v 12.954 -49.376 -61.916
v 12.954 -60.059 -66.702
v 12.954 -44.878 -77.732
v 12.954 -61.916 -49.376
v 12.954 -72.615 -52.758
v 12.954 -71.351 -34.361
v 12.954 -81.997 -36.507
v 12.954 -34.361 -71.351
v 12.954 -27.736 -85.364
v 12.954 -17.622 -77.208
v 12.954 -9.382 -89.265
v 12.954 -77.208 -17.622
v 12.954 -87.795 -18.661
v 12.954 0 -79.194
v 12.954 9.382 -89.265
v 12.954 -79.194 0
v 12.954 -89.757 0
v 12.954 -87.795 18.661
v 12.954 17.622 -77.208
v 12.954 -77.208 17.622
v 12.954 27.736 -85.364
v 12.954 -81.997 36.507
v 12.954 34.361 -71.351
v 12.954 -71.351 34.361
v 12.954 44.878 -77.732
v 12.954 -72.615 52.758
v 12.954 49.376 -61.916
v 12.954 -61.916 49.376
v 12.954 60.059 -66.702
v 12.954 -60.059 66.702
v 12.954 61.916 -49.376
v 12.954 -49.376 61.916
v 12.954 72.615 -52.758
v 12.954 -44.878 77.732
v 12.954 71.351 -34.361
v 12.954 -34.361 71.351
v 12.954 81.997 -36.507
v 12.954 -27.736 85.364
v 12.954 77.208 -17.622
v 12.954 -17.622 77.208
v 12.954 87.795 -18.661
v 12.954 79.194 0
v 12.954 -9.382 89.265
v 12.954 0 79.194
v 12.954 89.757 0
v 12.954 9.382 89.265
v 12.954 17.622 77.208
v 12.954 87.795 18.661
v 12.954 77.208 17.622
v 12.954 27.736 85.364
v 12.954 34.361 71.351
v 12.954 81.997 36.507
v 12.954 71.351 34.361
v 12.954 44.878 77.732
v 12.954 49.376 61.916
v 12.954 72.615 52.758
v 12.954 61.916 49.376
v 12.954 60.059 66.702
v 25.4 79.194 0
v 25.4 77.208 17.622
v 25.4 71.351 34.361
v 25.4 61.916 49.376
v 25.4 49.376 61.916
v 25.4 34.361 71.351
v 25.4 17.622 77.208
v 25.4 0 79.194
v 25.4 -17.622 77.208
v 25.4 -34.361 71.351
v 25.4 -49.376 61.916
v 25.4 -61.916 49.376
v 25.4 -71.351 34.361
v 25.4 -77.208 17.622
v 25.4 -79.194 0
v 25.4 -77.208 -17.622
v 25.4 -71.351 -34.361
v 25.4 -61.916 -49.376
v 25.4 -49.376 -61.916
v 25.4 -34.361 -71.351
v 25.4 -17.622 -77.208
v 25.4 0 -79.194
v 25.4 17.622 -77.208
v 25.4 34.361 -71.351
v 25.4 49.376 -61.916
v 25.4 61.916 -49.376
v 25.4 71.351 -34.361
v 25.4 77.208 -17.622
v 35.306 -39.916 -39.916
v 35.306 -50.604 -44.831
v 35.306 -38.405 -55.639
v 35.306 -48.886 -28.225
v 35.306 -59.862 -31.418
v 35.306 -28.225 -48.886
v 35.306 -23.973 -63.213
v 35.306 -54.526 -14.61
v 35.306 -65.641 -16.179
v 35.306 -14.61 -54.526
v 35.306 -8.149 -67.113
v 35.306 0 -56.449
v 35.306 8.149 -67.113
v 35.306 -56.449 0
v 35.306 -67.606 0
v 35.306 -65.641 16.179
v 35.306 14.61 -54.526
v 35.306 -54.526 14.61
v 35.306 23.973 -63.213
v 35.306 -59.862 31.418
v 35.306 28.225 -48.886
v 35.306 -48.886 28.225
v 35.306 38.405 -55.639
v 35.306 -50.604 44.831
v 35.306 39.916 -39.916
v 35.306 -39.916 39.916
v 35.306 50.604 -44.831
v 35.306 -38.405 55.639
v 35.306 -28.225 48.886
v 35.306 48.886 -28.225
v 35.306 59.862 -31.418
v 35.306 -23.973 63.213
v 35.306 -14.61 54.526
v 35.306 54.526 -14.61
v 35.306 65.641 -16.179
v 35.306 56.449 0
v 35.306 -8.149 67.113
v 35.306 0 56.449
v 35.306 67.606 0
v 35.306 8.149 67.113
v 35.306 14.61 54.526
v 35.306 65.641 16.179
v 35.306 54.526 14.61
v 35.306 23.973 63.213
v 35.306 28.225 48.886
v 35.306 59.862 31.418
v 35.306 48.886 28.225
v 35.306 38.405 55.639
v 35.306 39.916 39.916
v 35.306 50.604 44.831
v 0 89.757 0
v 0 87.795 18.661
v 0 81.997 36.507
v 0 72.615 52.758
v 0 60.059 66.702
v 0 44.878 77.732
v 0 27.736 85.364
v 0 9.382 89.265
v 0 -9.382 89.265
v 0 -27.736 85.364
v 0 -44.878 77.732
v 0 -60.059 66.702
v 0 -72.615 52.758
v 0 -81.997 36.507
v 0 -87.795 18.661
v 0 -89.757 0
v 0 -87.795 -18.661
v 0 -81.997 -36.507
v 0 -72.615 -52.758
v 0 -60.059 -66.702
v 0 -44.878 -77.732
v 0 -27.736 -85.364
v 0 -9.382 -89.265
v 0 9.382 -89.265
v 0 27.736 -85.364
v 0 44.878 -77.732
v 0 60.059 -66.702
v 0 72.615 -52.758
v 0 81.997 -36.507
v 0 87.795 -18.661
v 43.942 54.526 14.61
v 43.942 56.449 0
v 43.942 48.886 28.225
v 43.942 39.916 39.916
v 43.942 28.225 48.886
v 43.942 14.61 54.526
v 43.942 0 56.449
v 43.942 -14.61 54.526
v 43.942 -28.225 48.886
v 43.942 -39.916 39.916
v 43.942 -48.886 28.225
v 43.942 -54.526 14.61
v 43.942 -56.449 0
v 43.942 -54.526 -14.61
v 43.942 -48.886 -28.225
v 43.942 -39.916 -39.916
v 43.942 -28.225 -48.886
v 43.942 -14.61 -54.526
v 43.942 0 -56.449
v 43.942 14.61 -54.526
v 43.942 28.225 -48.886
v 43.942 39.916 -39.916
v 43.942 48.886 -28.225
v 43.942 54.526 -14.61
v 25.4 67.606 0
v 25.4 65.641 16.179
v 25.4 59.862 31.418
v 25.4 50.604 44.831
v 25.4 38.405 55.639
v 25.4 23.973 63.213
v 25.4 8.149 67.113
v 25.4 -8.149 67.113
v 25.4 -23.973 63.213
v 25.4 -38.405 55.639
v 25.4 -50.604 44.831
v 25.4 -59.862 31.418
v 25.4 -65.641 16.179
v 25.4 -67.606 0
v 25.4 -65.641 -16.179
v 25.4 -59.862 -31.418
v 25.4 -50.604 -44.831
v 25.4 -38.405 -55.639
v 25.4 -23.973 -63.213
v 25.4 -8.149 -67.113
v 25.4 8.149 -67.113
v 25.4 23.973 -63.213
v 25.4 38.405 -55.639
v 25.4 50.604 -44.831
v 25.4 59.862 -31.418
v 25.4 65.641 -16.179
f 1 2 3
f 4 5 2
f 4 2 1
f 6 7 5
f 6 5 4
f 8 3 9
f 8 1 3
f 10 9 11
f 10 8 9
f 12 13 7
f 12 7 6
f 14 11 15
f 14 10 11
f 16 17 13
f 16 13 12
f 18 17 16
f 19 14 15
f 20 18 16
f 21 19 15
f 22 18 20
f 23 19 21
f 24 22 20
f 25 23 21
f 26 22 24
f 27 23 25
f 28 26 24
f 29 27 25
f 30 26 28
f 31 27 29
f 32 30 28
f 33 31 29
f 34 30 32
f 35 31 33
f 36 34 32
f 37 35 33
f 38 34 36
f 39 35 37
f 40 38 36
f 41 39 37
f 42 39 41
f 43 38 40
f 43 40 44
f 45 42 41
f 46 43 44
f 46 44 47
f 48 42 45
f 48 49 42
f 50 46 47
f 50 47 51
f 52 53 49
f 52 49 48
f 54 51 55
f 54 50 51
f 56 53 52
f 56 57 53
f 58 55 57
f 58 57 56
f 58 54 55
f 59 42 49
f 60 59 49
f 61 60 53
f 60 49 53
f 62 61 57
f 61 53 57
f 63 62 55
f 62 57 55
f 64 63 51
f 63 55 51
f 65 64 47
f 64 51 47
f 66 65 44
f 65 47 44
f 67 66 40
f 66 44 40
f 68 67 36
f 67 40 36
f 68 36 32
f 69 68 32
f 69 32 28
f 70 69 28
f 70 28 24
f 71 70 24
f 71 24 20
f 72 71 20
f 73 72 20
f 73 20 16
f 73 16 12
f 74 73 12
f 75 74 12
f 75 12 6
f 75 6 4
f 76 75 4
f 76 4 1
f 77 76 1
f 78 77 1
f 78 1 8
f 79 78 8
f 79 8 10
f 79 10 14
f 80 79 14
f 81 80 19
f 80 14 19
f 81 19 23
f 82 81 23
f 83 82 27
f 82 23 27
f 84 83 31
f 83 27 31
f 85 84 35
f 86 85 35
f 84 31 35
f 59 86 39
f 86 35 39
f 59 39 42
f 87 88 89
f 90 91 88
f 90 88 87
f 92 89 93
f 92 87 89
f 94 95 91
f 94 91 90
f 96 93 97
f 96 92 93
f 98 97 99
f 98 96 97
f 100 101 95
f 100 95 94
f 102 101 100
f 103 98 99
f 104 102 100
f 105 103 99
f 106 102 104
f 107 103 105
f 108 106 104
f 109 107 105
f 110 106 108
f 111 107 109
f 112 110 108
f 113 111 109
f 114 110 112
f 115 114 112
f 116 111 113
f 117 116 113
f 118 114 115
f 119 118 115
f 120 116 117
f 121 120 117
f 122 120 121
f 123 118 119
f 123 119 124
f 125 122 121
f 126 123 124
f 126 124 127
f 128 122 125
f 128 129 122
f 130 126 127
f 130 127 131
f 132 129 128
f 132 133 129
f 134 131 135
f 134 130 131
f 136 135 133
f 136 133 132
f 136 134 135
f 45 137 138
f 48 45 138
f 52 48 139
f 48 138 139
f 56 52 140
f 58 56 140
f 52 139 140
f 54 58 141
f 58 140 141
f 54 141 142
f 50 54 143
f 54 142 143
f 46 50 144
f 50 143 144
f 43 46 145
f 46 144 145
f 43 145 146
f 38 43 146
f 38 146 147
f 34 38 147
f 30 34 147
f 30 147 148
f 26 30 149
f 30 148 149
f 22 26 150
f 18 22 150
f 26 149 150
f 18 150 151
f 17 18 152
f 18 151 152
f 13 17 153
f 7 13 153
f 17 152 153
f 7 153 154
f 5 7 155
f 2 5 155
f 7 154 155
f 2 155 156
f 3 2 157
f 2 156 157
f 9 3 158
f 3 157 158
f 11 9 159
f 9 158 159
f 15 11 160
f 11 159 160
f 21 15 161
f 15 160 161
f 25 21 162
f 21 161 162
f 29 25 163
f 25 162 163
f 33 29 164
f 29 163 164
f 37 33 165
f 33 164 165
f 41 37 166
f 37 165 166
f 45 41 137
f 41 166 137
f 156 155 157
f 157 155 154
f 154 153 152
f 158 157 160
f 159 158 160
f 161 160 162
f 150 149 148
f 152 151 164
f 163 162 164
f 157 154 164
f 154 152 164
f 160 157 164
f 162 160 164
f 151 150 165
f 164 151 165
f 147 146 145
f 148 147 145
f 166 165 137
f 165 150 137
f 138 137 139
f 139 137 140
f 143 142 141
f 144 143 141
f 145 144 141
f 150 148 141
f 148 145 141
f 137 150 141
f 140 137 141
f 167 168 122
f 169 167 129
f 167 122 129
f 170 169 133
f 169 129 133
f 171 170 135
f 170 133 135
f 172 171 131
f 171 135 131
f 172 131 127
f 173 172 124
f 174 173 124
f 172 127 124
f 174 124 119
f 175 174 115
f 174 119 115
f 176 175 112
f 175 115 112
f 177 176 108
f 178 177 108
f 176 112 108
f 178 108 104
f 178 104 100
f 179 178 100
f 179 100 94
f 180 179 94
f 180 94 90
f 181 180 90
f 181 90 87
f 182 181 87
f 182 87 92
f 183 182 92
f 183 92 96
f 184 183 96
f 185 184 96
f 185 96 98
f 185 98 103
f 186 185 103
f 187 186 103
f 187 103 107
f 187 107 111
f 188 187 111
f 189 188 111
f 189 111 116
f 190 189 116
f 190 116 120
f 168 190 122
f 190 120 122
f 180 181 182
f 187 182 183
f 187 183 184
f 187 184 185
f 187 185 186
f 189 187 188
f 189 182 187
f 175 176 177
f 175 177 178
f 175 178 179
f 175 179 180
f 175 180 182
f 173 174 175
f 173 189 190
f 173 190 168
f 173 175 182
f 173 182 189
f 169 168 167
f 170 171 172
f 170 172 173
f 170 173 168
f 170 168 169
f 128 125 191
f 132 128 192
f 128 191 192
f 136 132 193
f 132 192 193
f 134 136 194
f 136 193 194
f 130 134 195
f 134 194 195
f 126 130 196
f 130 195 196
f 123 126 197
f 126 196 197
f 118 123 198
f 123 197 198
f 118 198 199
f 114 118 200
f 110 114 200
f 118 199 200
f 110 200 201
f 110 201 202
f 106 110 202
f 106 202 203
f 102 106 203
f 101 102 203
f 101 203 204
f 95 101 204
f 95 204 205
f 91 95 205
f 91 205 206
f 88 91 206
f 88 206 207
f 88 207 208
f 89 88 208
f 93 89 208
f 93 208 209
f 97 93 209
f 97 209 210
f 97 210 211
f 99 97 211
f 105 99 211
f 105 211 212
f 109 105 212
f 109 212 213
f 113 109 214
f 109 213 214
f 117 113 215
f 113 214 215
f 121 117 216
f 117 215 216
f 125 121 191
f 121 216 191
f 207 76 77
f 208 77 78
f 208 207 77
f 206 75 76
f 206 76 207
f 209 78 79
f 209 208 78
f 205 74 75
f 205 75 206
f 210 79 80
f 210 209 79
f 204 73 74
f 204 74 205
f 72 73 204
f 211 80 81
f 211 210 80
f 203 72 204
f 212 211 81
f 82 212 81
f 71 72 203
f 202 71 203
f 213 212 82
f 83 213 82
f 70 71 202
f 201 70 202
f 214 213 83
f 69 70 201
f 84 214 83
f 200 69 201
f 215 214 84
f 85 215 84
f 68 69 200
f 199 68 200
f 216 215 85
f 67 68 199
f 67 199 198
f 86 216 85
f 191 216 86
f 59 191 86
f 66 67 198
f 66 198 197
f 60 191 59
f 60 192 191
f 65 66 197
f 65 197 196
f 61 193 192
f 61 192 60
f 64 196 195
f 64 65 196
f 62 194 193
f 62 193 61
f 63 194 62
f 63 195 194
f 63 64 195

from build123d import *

# Parameters (mm, degrees)
F0_R     = 89.756826
F4_DEPTH = 12.954
F1_R     = 79.193575
F5_DEPTH = 25.4
F2_R     = 67.606004
F6_DEPTH = 35.306
F3_R     = 56.449145
F7_DEPTH = 43.942


with BuildPart() as f4:
    # F0 (on Right) → F4 (new body)
    with BuildSketch(Plane.YZ):
        Circle(F0_R)
    extrude(amount=F4_DEPTH)

    # F1 (on Right) → F5 (join)
    with BuildSketch(Plane.YZ):
        Circle(F1_R)
    extrude(amount=F5_DEPTH)

    # F2 (on Right) → F6 (join)
    with BuildSketch(Plane.YZ):
        Circle(F2_R)
    extrude(amount=F6_DEPTH)

    # F3 (on Right) → F7 (join)
    with BuildSketch(Plane.YZ):
        Circle(F3_R)
    extrude(amount=F7_DEPTH)


solid = f4.part
